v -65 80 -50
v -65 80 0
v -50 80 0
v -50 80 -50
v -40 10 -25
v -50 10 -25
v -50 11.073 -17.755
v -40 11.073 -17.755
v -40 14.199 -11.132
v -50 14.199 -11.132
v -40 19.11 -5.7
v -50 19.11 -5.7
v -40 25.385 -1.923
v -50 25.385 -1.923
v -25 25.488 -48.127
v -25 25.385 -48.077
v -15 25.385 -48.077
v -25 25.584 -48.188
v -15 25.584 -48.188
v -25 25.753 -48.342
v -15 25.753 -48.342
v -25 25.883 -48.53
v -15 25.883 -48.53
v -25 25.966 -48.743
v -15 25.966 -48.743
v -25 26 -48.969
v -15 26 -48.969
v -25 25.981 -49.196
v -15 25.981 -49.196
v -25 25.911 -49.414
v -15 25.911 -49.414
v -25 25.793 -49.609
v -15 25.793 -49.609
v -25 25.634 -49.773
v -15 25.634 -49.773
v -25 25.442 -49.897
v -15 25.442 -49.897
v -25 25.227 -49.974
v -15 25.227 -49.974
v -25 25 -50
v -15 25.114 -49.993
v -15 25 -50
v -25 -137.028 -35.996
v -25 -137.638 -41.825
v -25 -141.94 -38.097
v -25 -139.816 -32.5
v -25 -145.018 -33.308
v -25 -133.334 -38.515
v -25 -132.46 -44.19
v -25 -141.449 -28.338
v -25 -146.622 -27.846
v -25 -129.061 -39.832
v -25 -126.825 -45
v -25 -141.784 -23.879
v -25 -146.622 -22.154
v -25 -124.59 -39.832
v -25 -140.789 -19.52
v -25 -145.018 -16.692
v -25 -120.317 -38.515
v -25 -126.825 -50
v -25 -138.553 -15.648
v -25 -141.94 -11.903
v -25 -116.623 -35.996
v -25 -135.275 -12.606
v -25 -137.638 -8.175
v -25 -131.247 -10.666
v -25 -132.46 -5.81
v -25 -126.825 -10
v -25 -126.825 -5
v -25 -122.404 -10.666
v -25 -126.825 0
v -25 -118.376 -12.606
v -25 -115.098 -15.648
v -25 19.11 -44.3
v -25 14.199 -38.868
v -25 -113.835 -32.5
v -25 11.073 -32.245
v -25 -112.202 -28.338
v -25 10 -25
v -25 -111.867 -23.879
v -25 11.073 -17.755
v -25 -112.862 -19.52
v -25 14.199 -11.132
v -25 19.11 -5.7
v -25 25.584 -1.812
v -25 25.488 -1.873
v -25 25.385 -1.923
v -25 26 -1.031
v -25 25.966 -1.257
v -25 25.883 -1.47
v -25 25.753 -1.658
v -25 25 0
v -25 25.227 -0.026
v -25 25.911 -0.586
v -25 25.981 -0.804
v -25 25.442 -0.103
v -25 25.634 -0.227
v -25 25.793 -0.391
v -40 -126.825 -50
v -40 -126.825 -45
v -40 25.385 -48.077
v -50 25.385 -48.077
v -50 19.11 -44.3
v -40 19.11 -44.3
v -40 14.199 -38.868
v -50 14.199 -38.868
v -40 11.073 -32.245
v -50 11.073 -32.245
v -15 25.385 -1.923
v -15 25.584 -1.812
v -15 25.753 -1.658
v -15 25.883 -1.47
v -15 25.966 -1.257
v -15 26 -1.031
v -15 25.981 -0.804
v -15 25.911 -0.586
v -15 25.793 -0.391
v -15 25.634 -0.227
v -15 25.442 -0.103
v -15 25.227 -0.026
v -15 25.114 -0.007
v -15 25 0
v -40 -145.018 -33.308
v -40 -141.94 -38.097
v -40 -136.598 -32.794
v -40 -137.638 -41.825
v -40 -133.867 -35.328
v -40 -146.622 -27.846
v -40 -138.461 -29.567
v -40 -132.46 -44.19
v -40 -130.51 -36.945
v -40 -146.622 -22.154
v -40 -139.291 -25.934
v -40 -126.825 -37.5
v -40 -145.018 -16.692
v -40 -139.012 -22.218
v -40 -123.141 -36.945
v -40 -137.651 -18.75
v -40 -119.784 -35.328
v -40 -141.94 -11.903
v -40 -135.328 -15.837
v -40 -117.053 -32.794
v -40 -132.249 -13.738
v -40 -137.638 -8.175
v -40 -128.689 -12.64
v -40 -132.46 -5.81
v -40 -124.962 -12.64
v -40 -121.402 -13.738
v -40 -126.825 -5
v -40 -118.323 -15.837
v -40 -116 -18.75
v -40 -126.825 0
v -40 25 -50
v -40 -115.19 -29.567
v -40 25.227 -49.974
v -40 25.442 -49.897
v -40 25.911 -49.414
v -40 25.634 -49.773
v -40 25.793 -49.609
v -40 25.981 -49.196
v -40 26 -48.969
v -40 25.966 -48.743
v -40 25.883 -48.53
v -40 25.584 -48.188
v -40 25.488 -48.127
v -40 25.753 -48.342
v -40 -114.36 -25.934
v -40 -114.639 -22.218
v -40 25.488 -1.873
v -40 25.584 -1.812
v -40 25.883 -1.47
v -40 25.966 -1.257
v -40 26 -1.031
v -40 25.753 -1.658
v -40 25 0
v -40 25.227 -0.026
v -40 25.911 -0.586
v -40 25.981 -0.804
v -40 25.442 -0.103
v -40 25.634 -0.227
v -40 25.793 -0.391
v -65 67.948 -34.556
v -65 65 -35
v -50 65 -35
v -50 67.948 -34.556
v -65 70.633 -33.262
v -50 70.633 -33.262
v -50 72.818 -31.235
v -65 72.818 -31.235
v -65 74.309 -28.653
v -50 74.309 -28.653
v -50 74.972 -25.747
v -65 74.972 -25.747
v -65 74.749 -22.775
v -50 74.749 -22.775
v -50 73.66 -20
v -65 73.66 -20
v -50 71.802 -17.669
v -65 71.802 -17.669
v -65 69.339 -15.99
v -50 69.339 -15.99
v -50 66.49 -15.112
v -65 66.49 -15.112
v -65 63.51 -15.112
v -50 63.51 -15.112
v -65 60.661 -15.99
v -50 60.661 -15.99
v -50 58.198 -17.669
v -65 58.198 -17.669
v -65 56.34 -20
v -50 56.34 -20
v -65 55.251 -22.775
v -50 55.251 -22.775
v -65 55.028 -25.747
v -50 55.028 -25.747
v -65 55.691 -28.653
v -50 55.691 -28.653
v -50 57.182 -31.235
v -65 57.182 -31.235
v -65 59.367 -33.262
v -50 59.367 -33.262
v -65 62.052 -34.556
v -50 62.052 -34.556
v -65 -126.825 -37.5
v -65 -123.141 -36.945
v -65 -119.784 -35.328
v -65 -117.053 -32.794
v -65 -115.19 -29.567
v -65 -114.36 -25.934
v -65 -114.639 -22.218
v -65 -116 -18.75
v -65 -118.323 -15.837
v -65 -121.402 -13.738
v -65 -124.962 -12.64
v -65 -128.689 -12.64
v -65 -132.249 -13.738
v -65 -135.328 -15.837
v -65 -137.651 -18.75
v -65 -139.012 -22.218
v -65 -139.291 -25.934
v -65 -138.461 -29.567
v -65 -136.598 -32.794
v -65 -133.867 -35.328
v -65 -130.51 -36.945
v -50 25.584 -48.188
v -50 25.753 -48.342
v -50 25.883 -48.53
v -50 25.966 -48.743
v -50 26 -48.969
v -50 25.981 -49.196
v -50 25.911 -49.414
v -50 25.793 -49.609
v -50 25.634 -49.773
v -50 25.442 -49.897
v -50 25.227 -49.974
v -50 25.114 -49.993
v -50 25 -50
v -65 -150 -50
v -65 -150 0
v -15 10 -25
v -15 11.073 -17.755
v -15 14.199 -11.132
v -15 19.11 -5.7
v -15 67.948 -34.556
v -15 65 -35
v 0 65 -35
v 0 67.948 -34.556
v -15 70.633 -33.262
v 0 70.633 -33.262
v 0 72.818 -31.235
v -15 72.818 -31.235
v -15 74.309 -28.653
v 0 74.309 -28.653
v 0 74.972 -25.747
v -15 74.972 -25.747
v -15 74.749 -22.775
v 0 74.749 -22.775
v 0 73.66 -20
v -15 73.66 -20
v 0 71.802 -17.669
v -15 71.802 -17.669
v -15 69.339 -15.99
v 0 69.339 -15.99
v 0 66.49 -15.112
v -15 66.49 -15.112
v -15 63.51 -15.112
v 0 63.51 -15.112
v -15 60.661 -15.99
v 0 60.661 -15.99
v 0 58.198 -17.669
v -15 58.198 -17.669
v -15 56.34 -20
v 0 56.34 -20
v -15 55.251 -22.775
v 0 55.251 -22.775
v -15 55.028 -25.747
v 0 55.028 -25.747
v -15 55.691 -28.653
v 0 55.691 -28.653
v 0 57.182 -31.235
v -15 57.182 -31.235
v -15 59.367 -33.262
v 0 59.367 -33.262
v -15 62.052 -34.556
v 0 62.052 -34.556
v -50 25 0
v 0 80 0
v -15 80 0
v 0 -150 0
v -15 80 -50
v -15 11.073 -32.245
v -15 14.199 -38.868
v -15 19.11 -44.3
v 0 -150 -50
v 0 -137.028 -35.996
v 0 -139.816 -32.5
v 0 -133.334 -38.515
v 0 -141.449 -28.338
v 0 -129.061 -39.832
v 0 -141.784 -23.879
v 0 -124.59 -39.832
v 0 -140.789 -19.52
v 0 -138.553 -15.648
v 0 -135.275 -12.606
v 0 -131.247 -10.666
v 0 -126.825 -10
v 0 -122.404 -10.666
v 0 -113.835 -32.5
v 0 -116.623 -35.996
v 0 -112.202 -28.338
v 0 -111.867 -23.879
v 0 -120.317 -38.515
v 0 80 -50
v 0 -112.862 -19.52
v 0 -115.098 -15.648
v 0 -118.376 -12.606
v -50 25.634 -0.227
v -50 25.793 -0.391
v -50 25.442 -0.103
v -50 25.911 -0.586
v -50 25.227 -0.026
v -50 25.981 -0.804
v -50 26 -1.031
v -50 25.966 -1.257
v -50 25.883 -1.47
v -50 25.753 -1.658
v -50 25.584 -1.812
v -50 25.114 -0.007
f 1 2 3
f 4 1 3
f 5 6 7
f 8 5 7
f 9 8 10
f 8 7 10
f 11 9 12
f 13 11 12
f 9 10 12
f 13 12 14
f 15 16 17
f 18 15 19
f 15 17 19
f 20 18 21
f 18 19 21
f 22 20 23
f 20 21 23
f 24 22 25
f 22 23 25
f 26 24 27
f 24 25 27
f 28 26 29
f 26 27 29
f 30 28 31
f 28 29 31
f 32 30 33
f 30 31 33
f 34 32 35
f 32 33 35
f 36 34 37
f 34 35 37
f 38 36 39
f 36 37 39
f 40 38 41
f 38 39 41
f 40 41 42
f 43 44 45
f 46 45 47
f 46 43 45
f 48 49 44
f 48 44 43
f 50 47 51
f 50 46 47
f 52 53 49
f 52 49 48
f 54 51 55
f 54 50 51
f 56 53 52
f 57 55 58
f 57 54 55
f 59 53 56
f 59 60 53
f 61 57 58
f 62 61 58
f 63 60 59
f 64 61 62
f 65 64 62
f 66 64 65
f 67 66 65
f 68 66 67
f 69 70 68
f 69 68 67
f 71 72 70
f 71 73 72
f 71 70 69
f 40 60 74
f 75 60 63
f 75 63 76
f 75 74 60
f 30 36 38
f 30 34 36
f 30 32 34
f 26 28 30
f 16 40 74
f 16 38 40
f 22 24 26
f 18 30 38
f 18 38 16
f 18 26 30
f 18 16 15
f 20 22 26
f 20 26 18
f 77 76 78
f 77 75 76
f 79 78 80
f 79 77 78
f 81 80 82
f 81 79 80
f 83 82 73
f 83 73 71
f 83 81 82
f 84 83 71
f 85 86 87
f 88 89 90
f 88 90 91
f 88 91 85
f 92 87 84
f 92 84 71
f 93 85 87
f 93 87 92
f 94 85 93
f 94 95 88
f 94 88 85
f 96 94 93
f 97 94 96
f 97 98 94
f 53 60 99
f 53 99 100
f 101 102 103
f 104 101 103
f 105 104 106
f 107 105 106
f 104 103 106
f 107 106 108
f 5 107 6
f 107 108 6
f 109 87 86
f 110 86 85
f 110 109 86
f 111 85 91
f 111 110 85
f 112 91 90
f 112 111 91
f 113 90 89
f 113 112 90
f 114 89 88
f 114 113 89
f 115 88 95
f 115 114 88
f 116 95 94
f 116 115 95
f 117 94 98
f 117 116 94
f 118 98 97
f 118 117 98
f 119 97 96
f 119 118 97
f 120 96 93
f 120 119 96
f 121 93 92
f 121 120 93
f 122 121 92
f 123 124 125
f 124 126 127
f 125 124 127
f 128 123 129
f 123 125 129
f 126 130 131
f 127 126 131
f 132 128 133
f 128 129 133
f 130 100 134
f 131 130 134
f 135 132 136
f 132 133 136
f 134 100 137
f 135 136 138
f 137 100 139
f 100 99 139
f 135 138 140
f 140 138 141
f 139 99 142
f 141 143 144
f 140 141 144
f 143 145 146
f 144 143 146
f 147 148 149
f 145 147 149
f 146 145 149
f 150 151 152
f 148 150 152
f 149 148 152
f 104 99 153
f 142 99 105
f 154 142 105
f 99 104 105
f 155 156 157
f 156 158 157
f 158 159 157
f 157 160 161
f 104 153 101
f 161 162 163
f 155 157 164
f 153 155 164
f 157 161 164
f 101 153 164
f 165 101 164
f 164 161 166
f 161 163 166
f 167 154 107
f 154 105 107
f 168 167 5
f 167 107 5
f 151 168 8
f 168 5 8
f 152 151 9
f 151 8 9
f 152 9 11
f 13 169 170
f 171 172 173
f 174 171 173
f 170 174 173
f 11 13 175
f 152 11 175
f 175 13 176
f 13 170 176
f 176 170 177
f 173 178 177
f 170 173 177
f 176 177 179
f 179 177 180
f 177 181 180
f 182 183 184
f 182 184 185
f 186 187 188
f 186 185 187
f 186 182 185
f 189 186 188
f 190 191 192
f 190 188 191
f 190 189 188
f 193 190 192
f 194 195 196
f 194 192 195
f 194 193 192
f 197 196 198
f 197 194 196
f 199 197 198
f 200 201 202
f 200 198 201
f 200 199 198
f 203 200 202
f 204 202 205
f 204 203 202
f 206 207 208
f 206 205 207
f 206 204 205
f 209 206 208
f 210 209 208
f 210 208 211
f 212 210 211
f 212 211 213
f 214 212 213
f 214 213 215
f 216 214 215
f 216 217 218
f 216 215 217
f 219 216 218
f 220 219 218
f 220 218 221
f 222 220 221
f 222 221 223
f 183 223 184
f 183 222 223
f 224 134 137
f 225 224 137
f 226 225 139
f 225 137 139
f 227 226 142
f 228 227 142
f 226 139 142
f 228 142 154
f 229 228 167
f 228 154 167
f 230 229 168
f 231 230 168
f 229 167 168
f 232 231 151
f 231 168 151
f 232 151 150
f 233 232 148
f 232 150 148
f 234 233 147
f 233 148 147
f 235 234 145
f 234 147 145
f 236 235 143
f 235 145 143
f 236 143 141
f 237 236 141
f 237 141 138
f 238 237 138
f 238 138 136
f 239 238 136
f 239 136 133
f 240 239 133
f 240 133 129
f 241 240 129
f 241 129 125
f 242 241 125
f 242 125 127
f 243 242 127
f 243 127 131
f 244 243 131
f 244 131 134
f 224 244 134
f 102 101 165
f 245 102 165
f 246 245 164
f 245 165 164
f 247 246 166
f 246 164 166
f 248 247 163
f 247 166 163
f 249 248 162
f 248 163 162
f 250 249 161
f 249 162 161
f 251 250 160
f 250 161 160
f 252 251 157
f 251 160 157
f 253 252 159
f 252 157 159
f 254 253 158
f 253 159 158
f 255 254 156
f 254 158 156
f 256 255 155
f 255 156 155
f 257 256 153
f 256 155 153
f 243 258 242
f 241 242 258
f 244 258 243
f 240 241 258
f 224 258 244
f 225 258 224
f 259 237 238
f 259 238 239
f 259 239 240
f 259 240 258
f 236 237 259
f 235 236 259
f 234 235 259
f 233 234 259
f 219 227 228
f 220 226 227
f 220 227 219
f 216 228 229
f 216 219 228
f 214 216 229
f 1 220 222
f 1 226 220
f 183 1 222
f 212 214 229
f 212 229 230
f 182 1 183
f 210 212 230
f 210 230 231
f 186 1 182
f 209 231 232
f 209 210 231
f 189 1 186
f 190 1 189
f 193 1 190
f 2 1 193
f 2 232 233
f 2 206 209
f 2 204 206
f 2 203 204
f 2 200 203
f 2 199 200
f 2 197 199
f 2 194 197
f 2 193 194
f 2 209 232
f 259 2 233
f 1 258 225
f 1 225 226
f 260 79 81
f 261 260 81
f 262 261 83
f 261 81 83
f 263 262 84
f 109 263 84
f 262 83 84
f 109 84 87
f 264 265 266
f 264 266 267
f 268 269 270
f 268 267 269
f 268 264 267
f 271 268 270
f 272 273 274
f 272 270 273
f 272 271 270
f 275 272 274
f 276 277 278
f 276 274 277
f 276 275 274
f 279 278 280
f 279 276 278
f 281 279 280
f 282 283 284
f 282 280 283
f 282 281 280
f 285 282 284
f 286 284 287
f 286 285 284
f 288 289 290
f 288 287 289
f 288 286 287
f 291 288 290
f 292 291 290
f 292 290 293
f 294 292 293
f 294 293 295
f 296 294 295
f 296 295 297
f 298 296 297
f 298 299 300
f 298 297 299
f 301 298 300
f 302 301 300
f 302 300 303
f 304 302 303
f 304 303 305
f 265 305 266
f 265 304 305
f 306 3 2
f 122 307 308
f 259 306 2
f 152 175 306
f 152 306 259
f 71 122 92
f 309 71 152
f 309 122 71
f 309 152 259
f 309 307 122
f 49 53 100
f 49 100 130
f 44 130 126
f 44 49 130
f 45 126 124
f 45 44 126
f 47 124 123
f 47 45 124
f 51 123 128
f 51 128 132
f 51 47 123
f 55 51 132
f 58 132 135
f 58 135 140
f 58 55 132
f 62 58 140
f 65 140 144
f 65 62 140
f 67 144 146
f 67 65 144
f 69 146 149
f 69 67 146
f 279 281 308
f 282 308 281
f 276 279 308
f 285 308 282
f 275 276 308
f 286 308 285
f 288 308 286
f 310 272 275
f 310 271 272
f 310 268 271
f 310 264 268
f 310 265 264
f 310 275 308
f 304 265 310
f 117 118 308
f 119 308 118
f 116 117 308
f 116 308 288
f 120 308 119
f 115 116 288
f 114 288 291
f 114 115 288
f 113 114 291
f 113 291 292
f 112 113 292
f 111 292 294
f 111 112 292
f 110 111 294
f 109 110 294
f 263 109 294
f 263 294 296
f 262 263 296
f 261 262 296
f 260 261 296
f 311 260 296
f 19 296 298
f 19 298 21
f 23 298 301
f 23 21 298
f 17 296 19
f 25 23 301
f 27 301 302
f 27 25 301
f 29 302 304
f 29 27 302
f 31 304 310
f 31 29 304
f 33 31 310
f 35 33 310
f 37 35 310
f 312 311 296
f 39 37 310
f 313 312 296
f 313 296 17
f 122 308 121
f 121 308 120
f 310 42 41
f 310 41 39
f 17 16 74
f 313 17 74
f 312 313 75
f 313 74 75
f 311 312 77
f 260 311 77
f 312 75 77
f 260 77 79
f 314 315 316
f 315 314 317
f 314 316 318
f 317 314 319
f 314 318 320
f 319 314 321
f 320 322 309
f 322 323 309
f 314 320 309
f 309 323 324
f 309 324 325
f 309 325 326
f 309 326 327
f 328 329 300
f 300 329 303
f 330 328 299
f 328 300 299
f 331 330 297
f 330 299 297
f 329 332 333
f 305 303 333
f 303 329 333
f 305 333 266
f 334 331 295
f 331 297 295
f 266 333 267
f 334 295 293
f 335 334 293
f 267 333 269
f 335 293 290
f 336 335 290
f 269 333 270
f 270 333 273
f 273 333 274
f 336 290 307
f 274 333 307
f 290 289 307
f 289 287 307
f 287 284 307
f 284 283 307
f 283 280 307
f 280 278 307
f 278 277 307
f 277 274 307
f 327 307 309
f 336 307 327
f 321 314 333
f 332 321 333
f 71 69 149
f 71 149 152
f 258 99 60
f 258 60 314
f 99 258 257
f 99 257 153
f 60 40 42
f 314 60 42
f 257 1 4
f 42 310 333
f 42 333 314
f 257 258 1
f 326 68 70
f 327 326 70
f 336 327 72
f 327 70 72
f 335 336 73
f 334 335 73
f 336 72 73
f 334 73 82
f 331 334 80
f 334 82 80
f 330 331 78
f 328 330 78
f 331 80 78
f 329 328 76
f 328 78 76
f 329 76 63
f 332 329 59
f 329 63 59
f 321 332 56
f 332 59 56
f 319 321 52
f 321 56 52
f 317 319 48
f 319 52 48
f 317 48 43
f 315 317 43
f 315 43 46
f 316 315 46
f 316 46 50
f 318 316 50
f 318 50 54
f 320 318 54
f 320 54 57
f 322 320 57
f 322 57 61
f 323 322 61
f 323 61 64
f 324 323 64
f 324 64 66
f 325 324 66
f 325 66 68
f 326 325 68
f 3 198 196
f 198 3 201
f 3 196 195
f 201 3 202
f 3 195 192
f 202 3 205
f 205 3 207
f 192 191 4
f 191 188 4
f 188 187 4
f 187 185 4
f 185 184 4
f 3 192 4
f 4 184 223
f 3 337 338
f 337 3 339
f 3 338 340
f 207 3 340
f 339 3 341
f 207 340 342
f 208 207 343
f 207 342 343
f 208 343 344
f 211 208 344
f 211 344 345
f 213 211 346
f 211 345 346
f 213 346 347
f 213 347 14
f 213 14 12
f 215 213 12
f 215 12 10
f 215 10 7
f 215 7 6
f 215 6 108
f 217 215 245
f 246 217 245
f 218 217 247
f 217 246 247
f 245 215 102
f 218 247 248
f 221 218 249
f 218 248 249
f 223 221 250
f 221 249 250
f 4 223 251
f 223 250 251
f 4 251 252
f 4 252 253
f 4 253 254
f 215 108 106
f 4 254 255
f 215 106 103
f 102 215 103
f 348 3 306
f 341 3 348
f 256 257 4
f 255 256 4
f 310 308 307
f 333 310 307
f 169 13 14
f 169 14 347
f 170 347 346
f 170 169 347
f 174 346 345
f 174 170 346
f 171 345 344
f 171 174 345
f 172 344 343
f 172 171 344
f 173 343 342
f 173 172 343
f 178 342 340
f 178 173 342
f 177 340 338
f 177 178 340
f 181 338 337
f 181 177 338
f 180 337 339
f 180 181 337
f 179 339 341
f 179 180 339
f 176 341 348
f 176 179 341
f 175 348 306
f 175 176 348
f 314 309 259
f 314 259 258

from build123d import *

# Parameters (mm, degrees)
SKETCH1_W               = 65
SKETCH1_H               = 50
BOSS_EXTRUDE1_DEPTH     = 10
SKETCH2_W               = 15
SKETCH2_H               = 50
BOSS_EXTRUDE2_DEPTH     = 70
CUT_EXTRUDE1_DEPTH      = 107.77078252
CUT_EXTRUDE1_DEPTH_BACK = 107.77078252
SKETCH3_R               = 10
BOSS_EXTRUDE7_REACH     = 108.771
FILLET1_R               = 1
SKETCH6_W               = 25
SKETCH6_H               = 50
BOSS_EXTRUDE8_DEPTH     = 150
SKETCH7_R               = 12.5
CUT_EXTRUDE2_DEPTH      = 150
SKETCH8_W               = 15
SKETCH8_H               = 50
CUT_EXTRUDE3_DEPTH      = 150
SKETCH11_W              = 25
SKETCH11_H              = 50
BOSS_EXTRUDE9_DEPTH     = 150
SKETCH12_R              = 15
CUT_EXTRUDE4_DEPTH      = 150
BOSS_EXTRUDE10_DEPTH    = 15


with BuildPart() as part:
    # Sketch1 → Boss-Extrude1 (new body)
    with BuildSketch(Plane(origin=(0, 0, 0), x_dir=(1, 0, 0), z_dir=(0, 1, 0))):
        with Locations((-32.5, 25)):
            Rectangle(SKETCH1_W, SKETCH1_H)
    extrude(amount=BOSS_EXTRUDE1_DEPTH)

    # Sketch2 → Boss-Extrude2 (add)
    with BuildSketch(Plane(origin=(0, 10, 0), x_dir=(1, 0, 0), z_dir=(0, 1, 0))):
        with Locations((-57.5, 25)):
            Rectangle(SKETCH2_W, SKETCH2_H)
        with Locations((-7.5, 25)):
            Rectangle(SKETCH2_W, SKETCH2_H)
    extrude(amount=BOSS_EXTRUDE2_DEPTH)

    # Sketch3 → Cut-Extrude1 (cut, two sides: drawn at the far end of the back side and taken through both)
    with BuildSketch(Plane(origin=(-50, 0, 0), x_dir=(0, 0, -1), z_dir=(1, 0, 0)).offset(-CUT_EXTRUDE1_DEPTH_BACK)):
        with Locations((25, 65)):
            Circle(SKETCH3_R)
    extrude(amount=CUT_EXTRUDE1_DEPTH + CUT_EXTRUDE1_DEPTH_BACK, mode=Mode.SUBTRACT)

    # Sketch5 → Boss-Extrude7 (add, up to next)
    with BuildSketch(Plane(origin=(-50, 0, 0), x_dir=(0, 0, -1), z_dir=(1, 0, 0)), mode=Mode.PRIVATE) as boss_extrude7_sk1:
        with BuildLine():
            Line((50, 10), (50, 35))
            ThreePointArc((50, 35), (42.67766953, 17.32233047), (25, 10))
            Line((25, 10), (50, 10))
        make_face()
    boss_extrude7_tool1 = extrude(boss_extrude7_sk1.sketch, amount=BOSS_EXTRUDE7_REACH, mode=Mode.PRIVATE) - part.part
    # Sketch5 → Boss-Extrude7 (add, up to next)
    with BuildSketch(Plane(origin=(-50, 0, 0), x_dir=(0, 0, -1), z_dir=(1, 0, 0)), mode=Mode.PRIVATE) as boss_extrude7_sk2:
        with BuildLine():
            ThreePointArc((25, 10), (7.32233047, 17.32233047), (0, 35))
            Line((0, 35), (0, 10))
            Line((0, 10), (25, 10))
        make_face()
    boss_extrude7_tool2 = extrude(boss_extrude7_sk2.sketch, amount=BOSS_EXTRUDE7_REACH, mode=Mode.PRIVATE) - part.part
    add(boss_extrude7_tool1.solids().sort_by_distance((-50, 15.584198, -44.415802))[0])
    add(boss_extrude7_tool2.solids().sort_by_distance((-50, 15.584198, -5.584198))[0])

    # Fillet1
    fillet1_edges = [part.edges().sort_by_distance(p)[0] for p in [
        (-32.5, 35, -50),
        (-32.5, 35, 0),
    ]]
    fillet(fillet1_edges, radius=FILLET1_R)

    # Sketch6 → Boss-Extrude8 (add)
    with BuildSketch(Plane.XZ):
        with Locations((-52.5, -25)):
            Rectangle(SKETCH6_W, SKETCH6_H)
    extrude(amount=BOSS_EXTRUDE8_DEPTH)

    # Sketch7 → Cut-Extrude2 (cut)
    with BuildSketch(Plane(origin=(-40, 0, 0), x_dir=(0, 0, -1), z_dir=(1, 0, 0))):
        with Locations((25, -126.825479142)):
            Circle(SKETCH7_R)
    extrude(amount=-CUT_EXTRUDE2_DEPTH, mode=Mode.SUBTRACT)

    # Sketch8 → Cut-Extrude3 (cut)
    with BuildSketch(Plane.XZ):
        with Locations((-32.5, -25)):
            Rectangle(SKETCH8_W, SKETCH8_H)
    extrude(amount=-CUT_EXTRUDE3_DEPTH, mode=Mode.SUBTRACT)


with BuildPart() as cut_extrude3_piece_1:
    # of the separate pieces the step leaves, piece 1, a body of its own (cut_extrude3_pieces)
    add(part.part.solids().sort_by_distance((-50, 25, 0))[0])



with BuildPart() as cut_extrude3_piece_2:
    # of the separate pieces the step leaves, piece 2, a body of its own (cut_extrude3_pieces)
    add(part.part.solids().sort_by_distance((-25, 25, 0))[0])

    # Sketch11 → Boss-Extrude9 (add)
    with BuildSketch(Plane.XZ):
        with Locations((-12.5, -25)):
            Rectangle(SKETCH11_W, SKETCH11_H)
    extrude(amount=BOSS_EXTRUDE9_DEPTH)

    # Sketch12 → Cut-Extrude4 (cut)
    with BuildSketch(Plane.ZY.offset(25)):
        with Locations((-25, -126.825479142)):
            Circle(SKETCH12_R)
    extrude(amount=-CUT_EXTRUDE4_DEPTH, mode=Mode.SUBTRACT)


with BuildPart() as cut_extrude3_piece_1_1:
    add(cut_extrude3_piece_1.part)

    add(cut_extrude3_piece_2.part)  # Boss-Extrude10 merges Cut-Extrude3 piece 2
    # Sketch14 → Boss-Extrude10 (add)
    with BuildSketch(Plane.ZY.offset(25)):
        with BuildLine():
            Line((-5, -126.825479142), (0, -126.825479142))
            Line((0, -126.825479142), (0, -150))
            Line((0, -150), (-50, -150))
            Line((-50, -150), (-50, -126.825479142))
            Line((-50, -126.825479142), (-45, -126.825479142))
            ThreePointArc((-45, -126.825479142), (-25, -146.825479142), (-5, -126.825479142))
        make_face()
    extrude(amount=BOSS_EXTRUDE10_DEPTH)


solid = cut_extrude3_piece_1_1.part
